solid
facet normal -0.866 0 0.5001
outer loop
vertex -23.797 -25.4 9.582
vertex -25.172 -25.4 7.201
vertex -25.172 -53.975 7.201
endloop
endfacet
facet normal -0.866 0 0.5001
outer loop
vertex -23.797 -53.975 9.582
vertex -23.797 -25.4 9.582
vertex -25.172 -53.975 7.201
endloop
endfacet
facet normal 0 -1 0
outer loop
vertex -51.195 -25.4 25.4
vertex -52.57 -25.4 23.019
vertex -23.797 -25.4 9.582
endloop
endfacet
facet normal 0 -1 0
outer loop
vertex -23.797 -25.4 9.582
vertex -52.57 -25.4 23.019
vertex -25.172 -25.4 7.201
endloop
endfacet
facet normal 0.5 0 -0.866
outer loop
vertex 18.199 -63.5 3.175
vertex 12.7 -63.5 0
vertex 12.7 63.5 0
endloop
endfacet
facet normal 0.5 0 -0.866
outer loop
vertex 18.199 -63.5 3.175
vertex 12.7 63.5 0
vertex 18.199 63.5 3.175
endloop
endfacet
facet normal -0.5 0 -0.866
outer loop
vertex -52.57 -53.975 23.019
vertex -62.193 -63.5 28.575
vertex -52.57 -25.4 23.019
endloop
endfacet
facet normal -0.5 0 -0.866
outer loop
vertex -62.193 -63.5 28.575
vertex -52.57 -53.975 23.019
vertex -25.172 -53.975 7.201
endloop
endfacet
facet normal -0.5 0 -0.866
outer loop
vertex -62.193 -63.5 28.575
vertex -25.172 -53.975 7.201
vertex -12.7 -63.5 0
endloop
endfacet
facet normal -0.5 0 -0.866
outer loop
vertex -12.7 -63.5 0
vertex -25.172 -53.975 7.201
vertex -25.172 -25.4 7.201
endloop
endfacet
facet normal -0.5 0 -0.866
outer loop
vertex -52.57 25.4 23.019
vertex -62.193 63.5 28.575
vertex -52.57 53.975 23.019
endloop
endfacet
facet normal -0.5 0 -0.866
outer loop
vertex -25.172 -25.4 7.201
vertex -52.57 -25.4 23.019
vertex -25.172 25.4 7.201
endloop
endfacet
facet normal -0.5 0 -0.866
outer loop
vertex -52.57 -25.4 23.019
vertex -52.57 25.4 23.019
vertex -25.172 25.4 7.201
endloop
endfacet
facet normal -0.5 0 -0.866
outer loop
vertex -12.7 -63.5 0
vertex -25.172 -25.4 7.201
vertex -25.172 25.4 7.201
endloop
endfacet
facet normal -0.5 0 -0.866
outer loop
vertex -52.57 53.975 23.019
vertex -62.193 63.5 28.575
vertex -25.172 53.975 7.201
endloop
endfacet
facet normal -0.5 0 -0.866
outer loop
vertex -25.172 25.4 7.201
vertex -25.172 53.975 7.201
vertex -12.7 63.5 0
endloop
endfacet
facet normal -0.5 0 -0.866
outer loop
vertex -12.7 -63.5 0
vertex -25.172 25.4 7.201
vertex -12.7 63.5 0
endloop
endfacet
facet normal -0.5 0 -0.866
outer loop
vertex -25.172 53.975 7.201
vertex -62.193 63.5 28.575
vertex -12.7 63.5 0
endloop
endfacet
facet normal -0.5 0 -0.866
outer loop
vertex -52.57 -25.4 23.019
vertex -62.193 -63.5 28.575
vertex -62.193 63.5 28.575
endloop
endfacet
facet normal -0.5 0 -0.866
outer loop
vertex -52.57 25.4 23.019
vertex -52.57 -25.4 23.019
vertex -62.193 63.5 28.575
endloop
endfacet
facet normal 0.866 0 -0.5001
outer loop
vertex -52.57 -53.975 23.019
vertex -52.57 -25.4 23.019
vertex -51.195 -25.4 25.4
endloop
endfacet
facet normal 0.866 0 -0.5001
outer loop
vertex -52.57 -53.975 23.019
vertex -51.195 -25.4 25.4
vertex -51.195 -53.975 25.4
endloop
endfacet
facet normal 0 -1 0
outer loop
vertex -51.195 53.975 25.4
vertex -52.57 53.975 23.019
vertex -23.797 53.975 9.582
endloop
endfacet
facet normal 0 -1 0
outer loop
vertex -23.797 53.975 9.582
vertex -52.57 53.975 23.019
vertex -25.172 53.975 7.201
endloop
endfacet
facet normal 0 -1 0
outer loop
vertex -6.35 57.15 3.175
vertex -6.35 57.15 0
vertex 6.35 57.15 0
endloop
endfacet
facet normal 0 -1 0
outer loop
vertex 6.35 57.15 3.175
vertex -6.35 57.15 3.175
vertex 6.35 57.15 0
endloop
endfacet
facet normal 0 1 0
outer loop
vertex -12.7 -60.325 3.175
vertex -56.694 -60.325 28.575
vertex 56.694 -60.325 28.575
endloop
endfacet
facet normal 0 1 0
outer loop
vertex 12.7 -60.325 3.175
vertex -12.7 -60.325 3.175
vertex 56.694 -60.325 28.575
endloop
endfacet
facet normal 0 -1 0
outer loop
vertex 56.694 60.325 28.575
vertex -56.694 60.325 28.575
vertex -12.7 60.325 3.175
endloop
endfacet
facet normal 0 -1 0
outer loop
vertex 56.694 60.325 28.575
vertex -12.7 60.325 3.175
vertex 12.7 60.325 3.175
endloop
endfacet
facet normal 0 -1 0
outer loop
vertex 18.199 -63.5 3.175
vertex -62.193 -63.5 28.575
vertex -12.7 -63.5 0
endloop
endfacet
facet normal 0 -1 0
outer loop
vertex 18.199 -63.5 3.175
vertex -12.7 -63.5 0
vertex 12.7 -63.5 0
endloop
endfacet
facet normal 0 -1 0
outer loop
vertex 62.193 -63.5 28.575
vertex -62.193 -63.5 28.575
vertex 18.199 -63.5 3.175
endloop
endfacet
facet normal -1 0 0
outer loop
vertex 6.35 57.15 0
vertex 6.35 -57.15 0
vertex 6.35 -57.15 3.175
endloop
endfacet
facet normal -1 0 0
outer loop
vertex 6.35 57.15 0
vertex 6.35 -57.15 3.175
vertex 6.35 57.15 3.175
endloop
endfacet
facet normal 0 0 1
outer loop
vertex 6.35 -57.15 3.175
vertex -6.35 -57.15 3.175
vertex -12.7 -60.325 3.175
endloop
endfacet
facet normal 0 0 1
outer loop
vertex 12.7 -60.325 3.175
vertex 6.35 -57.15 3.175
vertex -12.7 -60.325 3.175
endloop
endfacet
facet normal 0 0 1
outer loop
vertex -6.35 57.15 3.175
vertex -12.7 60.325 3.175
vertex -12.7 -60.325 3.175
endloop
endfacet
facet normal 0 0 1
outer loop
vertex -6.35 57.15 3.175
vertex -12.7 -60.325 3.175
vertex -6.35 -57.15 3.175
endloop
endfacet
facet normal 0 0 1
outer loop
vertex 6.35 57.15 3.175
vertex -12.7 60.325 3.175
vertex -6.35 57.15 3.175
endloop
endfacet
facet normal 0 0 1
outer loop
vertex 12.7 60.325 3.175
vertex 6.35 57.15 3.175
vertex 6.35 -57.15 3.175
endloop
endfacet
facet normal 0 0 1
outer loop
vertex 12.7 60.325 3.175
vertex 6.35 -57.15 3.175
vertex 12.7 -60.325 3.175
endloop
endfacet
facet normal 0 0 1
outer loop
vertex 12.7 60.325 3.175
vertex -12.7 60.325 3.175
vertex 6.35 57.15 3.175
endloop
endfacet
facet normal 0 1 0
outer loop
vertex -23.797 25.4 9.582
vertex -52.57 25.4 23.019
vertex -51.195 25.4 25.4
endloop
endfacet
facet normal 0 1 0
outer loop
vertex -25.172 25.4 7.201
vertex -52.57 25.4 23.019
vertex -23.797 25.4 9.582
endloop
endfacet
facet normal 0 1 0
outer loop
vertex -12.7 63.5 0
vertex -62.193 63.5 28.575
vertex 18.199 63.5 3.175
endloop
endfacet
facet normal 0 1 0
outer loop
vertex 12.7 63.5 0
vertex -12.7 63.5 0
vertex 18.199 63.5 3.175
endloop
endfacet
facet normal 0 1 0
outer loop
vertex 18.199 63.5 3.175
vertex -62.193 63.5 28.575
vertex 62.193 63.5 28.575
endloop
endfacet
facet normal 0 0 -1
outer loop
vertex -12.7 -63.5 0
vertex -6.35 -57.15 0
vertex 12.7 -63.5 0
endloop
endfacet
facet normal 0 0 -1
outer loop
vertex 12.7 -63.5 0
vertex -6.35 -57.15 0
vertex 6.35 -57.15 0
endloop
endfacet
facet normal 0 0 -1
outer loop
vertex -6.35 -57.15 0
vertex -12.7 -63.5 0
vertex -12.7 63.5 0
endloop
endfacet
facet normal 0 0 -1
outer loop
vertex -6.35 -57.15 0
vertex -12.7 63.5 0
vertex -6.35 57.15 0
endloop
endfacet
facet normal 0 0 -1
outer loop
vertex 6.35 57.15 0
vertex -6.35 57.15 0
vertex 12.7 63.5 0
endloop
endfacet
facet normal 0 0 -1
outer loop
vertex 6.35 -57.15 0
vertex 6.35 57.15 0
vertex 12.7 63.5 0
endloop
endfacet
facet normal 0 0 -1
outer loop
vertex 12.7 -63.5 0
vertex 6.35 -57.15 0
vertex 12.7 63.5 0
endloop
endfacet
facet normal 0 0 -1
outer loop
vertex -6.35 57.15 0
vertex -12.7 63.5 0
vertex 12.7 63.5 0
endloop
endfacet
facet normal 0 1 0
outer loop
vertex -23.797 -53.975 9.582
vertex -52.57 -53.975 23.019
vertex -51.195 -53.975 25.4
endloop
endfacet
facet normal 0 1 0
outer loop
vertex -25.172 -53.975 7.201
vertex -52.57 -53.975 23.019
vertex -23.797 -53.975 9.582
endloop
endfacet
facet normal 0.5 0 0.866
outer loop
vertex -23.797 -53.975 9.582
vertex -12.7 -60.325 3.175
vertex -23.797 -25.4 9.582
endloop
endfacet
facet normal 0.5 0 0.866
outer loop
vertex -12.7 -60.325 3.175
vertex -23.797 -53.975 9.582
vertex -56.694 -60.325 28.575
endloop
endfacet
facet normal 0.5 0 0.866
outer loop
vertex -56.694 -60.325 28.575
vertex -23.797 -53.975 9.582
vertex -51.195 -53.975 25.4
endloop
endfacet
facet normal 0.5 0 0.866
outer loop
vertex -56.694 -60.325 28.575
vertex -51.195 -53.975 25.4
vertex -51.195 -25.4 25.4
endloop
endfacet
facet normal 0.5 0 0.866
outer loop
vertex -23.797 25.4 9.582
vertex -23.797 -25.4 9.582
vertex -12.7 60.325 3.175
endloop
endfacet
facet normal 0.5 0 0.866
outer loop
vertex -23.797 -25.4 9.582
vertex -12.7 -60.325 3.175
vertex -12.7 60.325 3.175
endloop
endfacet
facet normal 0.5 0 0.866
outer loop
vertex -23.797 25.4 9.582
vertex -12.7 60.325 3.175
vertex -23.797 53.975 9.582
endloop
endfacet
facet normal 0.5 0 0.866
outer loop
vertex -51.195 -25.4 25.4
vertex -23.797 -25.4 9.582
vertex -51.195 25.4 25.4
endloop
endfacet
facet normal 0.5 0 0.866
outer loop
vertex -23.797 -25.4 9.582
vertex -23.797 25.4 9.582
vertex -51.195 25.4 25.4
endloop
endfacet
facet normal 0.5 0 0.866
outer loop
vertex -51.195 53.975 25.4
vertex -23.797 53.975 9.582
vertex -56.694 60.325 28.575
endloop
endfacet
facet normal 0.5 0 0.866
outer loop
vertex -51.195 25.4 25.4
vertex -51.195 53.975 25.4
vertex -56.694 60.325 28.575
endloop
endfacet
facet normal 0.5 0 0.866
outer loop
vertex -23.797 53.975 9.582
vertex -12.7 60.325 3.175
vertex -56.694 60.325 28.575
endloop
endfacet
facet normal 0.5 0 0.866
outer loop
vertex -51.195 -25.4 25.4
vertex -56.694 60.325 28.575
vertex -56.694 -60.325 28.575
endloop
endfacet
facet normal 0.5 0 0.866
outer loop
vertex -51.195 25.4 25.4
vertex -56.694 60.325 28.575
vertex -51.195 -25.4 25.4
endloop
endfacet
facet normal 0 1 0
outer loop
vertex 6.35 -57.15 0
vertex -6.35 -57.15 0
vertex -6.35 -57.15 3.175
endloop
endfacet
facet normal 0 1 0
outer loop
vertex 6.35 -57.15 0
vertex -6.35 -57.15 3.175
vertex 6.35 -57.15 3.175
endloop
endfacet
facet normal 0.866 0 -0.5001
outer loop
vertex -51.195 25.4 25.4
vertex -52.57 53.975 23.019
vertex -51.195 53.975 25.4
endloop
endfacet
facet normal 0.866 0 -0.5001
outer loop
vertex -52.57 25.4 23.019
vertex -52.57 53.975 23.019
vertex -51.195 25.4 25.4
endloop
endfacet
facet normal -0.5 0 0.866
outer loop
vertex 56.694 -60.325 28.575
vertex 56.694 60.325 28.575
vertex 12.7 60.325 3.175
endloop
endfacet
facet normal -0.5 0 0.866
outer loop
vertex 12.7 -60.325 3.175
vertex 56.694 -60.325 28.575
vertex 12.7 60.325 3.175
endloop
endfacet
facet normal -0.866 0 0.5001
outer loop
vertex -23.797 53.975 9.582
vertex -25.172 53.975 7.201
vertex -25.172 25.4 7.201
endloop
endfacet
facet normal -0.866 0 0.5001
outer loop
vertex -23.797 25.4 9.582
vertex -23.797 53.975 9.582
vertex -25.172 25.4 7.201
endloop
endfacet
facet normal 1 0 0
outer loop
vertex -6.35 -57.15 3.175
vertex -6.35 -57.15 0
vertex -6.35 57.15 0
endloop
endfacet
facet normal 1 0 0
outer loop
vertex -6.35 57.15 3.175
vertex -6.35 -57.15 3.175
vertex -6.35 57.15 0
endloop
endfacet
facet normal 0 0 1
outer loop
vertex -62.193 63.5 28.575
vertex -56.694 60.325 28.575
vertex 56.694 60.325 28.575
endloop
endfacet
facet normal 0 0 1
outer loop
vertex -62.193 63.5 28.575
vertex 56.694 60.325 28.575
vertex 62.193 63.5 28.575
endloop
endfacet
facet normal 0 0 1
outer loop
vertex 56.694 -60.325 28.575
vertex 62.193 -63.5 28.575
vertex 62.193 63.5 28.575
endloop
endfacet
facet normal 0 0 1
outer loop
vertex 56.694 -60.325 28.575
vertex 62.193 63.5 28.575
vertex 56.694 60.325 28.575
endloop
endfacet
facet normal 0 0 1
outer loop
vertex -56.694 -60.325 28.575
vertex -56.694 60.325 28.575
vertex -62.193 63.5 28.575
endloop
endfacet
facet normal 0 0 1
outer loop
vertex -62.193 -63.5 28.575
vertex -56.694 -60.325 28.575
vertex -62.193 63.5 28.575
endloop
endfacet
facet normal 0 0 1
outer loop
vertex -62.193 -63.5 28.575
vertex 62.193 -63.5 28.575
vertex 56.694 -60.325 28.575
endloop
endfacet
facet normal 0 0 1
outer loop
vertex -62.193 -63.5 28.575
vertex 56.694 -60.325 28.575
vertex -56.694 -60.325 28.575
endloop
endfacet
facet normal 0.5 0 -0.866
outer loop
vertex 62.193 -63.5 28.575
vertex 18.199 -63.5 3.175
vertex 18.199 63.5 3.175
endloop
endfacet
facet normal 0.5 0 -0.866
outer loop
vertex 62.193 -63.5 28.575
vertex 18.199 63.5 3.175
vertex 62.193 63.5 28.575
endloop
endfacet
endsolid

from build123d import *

# Parameters (mm, degrees)
F0_W          = 25.4
F0_H          = 127
F0_W_2        = 12.7
F0_H_2        = 114.3
F1_DEPTH      = 3.175
F3_DEPTH      = 63.5
F3_DEPTH_BACK = 63.5
F7_DEPTH      = 3.175
F9_DEPTH      = 3.175
F10_W         = 31.6360226281
F10_H         = 28.575
F11_DEPTH     = 62.1943518263


with BuildPart() as f1:
    # F0 (on Top) → F1 (new body)
    with BuildSketch(Plane.XY):
        Rectangle(F0_W, F0_H)
        Rectangle(F0_W_2, F0_H_2, mode=Mode.SUBTRACT)
    extrude(amount=F1_DEPTH)

    # F2 (on Front) → F3 (join, two sides)
    with BuildSketch(Plane.XZ) as f3_sk:
        Polygon((56.6940905122, 28.575), (12.7, 3.175), (18.199261314, 3.175), (62.1933518263, 28.575), align=None)
        Polygon((18.199261314, 3.175), (12.7, 3.175), (12.7, 0), align=None)
        Polygon((-12.7, 3.175), (-56.6940905122, 28.575), (-62.1933518263, 28.575), (-12.7, 0), align=None)
    extrude(amount=F3_DEPTH)
    extrude(f3_sk.sketch, amount=-F3_DEPTH_BACK)

    # F6 (on offset) → F7 (join)
    with BuildSketch(Plane.XZ.offset(63.5)):
        Polygon((62.1933518263, 28.575), (-62.1933518263, 28.575), (-12.7, 0), (12.7, 0), align=None)
    extrude(amount=-F7_DEPTH)

    # F8 (on offset) → F9 (join)
    with BuildSketch(Plane.XZ.offset(-63.5)):
        Polygon((62.1933518263, 28.575), (-62.1933518263, 28.575), (-12.7, 0), (12.7, 0), align=None)
    extrude(amount=F9_DEPTH)

    # F10 (on face) → F11 (cut, through all)
    with BuildSketch(Plane(origin=(-3.175, 0, -5.499261314), x_dir=(0.8660254038, 0, -0.5), z_dir=(-0.5, 0, -0.8660254038))):
        with Locations((-41.218011314, 39.6875)):
            Rectangle(F10_W, F10_H)
        with Locations((-41.218011314, -39.6875)):
            Rectangle(F10_W, F10_H)
    extrude(amount=-F11_DEPTH, mode=Mode.SUBTRACT)


solid = f1.part
